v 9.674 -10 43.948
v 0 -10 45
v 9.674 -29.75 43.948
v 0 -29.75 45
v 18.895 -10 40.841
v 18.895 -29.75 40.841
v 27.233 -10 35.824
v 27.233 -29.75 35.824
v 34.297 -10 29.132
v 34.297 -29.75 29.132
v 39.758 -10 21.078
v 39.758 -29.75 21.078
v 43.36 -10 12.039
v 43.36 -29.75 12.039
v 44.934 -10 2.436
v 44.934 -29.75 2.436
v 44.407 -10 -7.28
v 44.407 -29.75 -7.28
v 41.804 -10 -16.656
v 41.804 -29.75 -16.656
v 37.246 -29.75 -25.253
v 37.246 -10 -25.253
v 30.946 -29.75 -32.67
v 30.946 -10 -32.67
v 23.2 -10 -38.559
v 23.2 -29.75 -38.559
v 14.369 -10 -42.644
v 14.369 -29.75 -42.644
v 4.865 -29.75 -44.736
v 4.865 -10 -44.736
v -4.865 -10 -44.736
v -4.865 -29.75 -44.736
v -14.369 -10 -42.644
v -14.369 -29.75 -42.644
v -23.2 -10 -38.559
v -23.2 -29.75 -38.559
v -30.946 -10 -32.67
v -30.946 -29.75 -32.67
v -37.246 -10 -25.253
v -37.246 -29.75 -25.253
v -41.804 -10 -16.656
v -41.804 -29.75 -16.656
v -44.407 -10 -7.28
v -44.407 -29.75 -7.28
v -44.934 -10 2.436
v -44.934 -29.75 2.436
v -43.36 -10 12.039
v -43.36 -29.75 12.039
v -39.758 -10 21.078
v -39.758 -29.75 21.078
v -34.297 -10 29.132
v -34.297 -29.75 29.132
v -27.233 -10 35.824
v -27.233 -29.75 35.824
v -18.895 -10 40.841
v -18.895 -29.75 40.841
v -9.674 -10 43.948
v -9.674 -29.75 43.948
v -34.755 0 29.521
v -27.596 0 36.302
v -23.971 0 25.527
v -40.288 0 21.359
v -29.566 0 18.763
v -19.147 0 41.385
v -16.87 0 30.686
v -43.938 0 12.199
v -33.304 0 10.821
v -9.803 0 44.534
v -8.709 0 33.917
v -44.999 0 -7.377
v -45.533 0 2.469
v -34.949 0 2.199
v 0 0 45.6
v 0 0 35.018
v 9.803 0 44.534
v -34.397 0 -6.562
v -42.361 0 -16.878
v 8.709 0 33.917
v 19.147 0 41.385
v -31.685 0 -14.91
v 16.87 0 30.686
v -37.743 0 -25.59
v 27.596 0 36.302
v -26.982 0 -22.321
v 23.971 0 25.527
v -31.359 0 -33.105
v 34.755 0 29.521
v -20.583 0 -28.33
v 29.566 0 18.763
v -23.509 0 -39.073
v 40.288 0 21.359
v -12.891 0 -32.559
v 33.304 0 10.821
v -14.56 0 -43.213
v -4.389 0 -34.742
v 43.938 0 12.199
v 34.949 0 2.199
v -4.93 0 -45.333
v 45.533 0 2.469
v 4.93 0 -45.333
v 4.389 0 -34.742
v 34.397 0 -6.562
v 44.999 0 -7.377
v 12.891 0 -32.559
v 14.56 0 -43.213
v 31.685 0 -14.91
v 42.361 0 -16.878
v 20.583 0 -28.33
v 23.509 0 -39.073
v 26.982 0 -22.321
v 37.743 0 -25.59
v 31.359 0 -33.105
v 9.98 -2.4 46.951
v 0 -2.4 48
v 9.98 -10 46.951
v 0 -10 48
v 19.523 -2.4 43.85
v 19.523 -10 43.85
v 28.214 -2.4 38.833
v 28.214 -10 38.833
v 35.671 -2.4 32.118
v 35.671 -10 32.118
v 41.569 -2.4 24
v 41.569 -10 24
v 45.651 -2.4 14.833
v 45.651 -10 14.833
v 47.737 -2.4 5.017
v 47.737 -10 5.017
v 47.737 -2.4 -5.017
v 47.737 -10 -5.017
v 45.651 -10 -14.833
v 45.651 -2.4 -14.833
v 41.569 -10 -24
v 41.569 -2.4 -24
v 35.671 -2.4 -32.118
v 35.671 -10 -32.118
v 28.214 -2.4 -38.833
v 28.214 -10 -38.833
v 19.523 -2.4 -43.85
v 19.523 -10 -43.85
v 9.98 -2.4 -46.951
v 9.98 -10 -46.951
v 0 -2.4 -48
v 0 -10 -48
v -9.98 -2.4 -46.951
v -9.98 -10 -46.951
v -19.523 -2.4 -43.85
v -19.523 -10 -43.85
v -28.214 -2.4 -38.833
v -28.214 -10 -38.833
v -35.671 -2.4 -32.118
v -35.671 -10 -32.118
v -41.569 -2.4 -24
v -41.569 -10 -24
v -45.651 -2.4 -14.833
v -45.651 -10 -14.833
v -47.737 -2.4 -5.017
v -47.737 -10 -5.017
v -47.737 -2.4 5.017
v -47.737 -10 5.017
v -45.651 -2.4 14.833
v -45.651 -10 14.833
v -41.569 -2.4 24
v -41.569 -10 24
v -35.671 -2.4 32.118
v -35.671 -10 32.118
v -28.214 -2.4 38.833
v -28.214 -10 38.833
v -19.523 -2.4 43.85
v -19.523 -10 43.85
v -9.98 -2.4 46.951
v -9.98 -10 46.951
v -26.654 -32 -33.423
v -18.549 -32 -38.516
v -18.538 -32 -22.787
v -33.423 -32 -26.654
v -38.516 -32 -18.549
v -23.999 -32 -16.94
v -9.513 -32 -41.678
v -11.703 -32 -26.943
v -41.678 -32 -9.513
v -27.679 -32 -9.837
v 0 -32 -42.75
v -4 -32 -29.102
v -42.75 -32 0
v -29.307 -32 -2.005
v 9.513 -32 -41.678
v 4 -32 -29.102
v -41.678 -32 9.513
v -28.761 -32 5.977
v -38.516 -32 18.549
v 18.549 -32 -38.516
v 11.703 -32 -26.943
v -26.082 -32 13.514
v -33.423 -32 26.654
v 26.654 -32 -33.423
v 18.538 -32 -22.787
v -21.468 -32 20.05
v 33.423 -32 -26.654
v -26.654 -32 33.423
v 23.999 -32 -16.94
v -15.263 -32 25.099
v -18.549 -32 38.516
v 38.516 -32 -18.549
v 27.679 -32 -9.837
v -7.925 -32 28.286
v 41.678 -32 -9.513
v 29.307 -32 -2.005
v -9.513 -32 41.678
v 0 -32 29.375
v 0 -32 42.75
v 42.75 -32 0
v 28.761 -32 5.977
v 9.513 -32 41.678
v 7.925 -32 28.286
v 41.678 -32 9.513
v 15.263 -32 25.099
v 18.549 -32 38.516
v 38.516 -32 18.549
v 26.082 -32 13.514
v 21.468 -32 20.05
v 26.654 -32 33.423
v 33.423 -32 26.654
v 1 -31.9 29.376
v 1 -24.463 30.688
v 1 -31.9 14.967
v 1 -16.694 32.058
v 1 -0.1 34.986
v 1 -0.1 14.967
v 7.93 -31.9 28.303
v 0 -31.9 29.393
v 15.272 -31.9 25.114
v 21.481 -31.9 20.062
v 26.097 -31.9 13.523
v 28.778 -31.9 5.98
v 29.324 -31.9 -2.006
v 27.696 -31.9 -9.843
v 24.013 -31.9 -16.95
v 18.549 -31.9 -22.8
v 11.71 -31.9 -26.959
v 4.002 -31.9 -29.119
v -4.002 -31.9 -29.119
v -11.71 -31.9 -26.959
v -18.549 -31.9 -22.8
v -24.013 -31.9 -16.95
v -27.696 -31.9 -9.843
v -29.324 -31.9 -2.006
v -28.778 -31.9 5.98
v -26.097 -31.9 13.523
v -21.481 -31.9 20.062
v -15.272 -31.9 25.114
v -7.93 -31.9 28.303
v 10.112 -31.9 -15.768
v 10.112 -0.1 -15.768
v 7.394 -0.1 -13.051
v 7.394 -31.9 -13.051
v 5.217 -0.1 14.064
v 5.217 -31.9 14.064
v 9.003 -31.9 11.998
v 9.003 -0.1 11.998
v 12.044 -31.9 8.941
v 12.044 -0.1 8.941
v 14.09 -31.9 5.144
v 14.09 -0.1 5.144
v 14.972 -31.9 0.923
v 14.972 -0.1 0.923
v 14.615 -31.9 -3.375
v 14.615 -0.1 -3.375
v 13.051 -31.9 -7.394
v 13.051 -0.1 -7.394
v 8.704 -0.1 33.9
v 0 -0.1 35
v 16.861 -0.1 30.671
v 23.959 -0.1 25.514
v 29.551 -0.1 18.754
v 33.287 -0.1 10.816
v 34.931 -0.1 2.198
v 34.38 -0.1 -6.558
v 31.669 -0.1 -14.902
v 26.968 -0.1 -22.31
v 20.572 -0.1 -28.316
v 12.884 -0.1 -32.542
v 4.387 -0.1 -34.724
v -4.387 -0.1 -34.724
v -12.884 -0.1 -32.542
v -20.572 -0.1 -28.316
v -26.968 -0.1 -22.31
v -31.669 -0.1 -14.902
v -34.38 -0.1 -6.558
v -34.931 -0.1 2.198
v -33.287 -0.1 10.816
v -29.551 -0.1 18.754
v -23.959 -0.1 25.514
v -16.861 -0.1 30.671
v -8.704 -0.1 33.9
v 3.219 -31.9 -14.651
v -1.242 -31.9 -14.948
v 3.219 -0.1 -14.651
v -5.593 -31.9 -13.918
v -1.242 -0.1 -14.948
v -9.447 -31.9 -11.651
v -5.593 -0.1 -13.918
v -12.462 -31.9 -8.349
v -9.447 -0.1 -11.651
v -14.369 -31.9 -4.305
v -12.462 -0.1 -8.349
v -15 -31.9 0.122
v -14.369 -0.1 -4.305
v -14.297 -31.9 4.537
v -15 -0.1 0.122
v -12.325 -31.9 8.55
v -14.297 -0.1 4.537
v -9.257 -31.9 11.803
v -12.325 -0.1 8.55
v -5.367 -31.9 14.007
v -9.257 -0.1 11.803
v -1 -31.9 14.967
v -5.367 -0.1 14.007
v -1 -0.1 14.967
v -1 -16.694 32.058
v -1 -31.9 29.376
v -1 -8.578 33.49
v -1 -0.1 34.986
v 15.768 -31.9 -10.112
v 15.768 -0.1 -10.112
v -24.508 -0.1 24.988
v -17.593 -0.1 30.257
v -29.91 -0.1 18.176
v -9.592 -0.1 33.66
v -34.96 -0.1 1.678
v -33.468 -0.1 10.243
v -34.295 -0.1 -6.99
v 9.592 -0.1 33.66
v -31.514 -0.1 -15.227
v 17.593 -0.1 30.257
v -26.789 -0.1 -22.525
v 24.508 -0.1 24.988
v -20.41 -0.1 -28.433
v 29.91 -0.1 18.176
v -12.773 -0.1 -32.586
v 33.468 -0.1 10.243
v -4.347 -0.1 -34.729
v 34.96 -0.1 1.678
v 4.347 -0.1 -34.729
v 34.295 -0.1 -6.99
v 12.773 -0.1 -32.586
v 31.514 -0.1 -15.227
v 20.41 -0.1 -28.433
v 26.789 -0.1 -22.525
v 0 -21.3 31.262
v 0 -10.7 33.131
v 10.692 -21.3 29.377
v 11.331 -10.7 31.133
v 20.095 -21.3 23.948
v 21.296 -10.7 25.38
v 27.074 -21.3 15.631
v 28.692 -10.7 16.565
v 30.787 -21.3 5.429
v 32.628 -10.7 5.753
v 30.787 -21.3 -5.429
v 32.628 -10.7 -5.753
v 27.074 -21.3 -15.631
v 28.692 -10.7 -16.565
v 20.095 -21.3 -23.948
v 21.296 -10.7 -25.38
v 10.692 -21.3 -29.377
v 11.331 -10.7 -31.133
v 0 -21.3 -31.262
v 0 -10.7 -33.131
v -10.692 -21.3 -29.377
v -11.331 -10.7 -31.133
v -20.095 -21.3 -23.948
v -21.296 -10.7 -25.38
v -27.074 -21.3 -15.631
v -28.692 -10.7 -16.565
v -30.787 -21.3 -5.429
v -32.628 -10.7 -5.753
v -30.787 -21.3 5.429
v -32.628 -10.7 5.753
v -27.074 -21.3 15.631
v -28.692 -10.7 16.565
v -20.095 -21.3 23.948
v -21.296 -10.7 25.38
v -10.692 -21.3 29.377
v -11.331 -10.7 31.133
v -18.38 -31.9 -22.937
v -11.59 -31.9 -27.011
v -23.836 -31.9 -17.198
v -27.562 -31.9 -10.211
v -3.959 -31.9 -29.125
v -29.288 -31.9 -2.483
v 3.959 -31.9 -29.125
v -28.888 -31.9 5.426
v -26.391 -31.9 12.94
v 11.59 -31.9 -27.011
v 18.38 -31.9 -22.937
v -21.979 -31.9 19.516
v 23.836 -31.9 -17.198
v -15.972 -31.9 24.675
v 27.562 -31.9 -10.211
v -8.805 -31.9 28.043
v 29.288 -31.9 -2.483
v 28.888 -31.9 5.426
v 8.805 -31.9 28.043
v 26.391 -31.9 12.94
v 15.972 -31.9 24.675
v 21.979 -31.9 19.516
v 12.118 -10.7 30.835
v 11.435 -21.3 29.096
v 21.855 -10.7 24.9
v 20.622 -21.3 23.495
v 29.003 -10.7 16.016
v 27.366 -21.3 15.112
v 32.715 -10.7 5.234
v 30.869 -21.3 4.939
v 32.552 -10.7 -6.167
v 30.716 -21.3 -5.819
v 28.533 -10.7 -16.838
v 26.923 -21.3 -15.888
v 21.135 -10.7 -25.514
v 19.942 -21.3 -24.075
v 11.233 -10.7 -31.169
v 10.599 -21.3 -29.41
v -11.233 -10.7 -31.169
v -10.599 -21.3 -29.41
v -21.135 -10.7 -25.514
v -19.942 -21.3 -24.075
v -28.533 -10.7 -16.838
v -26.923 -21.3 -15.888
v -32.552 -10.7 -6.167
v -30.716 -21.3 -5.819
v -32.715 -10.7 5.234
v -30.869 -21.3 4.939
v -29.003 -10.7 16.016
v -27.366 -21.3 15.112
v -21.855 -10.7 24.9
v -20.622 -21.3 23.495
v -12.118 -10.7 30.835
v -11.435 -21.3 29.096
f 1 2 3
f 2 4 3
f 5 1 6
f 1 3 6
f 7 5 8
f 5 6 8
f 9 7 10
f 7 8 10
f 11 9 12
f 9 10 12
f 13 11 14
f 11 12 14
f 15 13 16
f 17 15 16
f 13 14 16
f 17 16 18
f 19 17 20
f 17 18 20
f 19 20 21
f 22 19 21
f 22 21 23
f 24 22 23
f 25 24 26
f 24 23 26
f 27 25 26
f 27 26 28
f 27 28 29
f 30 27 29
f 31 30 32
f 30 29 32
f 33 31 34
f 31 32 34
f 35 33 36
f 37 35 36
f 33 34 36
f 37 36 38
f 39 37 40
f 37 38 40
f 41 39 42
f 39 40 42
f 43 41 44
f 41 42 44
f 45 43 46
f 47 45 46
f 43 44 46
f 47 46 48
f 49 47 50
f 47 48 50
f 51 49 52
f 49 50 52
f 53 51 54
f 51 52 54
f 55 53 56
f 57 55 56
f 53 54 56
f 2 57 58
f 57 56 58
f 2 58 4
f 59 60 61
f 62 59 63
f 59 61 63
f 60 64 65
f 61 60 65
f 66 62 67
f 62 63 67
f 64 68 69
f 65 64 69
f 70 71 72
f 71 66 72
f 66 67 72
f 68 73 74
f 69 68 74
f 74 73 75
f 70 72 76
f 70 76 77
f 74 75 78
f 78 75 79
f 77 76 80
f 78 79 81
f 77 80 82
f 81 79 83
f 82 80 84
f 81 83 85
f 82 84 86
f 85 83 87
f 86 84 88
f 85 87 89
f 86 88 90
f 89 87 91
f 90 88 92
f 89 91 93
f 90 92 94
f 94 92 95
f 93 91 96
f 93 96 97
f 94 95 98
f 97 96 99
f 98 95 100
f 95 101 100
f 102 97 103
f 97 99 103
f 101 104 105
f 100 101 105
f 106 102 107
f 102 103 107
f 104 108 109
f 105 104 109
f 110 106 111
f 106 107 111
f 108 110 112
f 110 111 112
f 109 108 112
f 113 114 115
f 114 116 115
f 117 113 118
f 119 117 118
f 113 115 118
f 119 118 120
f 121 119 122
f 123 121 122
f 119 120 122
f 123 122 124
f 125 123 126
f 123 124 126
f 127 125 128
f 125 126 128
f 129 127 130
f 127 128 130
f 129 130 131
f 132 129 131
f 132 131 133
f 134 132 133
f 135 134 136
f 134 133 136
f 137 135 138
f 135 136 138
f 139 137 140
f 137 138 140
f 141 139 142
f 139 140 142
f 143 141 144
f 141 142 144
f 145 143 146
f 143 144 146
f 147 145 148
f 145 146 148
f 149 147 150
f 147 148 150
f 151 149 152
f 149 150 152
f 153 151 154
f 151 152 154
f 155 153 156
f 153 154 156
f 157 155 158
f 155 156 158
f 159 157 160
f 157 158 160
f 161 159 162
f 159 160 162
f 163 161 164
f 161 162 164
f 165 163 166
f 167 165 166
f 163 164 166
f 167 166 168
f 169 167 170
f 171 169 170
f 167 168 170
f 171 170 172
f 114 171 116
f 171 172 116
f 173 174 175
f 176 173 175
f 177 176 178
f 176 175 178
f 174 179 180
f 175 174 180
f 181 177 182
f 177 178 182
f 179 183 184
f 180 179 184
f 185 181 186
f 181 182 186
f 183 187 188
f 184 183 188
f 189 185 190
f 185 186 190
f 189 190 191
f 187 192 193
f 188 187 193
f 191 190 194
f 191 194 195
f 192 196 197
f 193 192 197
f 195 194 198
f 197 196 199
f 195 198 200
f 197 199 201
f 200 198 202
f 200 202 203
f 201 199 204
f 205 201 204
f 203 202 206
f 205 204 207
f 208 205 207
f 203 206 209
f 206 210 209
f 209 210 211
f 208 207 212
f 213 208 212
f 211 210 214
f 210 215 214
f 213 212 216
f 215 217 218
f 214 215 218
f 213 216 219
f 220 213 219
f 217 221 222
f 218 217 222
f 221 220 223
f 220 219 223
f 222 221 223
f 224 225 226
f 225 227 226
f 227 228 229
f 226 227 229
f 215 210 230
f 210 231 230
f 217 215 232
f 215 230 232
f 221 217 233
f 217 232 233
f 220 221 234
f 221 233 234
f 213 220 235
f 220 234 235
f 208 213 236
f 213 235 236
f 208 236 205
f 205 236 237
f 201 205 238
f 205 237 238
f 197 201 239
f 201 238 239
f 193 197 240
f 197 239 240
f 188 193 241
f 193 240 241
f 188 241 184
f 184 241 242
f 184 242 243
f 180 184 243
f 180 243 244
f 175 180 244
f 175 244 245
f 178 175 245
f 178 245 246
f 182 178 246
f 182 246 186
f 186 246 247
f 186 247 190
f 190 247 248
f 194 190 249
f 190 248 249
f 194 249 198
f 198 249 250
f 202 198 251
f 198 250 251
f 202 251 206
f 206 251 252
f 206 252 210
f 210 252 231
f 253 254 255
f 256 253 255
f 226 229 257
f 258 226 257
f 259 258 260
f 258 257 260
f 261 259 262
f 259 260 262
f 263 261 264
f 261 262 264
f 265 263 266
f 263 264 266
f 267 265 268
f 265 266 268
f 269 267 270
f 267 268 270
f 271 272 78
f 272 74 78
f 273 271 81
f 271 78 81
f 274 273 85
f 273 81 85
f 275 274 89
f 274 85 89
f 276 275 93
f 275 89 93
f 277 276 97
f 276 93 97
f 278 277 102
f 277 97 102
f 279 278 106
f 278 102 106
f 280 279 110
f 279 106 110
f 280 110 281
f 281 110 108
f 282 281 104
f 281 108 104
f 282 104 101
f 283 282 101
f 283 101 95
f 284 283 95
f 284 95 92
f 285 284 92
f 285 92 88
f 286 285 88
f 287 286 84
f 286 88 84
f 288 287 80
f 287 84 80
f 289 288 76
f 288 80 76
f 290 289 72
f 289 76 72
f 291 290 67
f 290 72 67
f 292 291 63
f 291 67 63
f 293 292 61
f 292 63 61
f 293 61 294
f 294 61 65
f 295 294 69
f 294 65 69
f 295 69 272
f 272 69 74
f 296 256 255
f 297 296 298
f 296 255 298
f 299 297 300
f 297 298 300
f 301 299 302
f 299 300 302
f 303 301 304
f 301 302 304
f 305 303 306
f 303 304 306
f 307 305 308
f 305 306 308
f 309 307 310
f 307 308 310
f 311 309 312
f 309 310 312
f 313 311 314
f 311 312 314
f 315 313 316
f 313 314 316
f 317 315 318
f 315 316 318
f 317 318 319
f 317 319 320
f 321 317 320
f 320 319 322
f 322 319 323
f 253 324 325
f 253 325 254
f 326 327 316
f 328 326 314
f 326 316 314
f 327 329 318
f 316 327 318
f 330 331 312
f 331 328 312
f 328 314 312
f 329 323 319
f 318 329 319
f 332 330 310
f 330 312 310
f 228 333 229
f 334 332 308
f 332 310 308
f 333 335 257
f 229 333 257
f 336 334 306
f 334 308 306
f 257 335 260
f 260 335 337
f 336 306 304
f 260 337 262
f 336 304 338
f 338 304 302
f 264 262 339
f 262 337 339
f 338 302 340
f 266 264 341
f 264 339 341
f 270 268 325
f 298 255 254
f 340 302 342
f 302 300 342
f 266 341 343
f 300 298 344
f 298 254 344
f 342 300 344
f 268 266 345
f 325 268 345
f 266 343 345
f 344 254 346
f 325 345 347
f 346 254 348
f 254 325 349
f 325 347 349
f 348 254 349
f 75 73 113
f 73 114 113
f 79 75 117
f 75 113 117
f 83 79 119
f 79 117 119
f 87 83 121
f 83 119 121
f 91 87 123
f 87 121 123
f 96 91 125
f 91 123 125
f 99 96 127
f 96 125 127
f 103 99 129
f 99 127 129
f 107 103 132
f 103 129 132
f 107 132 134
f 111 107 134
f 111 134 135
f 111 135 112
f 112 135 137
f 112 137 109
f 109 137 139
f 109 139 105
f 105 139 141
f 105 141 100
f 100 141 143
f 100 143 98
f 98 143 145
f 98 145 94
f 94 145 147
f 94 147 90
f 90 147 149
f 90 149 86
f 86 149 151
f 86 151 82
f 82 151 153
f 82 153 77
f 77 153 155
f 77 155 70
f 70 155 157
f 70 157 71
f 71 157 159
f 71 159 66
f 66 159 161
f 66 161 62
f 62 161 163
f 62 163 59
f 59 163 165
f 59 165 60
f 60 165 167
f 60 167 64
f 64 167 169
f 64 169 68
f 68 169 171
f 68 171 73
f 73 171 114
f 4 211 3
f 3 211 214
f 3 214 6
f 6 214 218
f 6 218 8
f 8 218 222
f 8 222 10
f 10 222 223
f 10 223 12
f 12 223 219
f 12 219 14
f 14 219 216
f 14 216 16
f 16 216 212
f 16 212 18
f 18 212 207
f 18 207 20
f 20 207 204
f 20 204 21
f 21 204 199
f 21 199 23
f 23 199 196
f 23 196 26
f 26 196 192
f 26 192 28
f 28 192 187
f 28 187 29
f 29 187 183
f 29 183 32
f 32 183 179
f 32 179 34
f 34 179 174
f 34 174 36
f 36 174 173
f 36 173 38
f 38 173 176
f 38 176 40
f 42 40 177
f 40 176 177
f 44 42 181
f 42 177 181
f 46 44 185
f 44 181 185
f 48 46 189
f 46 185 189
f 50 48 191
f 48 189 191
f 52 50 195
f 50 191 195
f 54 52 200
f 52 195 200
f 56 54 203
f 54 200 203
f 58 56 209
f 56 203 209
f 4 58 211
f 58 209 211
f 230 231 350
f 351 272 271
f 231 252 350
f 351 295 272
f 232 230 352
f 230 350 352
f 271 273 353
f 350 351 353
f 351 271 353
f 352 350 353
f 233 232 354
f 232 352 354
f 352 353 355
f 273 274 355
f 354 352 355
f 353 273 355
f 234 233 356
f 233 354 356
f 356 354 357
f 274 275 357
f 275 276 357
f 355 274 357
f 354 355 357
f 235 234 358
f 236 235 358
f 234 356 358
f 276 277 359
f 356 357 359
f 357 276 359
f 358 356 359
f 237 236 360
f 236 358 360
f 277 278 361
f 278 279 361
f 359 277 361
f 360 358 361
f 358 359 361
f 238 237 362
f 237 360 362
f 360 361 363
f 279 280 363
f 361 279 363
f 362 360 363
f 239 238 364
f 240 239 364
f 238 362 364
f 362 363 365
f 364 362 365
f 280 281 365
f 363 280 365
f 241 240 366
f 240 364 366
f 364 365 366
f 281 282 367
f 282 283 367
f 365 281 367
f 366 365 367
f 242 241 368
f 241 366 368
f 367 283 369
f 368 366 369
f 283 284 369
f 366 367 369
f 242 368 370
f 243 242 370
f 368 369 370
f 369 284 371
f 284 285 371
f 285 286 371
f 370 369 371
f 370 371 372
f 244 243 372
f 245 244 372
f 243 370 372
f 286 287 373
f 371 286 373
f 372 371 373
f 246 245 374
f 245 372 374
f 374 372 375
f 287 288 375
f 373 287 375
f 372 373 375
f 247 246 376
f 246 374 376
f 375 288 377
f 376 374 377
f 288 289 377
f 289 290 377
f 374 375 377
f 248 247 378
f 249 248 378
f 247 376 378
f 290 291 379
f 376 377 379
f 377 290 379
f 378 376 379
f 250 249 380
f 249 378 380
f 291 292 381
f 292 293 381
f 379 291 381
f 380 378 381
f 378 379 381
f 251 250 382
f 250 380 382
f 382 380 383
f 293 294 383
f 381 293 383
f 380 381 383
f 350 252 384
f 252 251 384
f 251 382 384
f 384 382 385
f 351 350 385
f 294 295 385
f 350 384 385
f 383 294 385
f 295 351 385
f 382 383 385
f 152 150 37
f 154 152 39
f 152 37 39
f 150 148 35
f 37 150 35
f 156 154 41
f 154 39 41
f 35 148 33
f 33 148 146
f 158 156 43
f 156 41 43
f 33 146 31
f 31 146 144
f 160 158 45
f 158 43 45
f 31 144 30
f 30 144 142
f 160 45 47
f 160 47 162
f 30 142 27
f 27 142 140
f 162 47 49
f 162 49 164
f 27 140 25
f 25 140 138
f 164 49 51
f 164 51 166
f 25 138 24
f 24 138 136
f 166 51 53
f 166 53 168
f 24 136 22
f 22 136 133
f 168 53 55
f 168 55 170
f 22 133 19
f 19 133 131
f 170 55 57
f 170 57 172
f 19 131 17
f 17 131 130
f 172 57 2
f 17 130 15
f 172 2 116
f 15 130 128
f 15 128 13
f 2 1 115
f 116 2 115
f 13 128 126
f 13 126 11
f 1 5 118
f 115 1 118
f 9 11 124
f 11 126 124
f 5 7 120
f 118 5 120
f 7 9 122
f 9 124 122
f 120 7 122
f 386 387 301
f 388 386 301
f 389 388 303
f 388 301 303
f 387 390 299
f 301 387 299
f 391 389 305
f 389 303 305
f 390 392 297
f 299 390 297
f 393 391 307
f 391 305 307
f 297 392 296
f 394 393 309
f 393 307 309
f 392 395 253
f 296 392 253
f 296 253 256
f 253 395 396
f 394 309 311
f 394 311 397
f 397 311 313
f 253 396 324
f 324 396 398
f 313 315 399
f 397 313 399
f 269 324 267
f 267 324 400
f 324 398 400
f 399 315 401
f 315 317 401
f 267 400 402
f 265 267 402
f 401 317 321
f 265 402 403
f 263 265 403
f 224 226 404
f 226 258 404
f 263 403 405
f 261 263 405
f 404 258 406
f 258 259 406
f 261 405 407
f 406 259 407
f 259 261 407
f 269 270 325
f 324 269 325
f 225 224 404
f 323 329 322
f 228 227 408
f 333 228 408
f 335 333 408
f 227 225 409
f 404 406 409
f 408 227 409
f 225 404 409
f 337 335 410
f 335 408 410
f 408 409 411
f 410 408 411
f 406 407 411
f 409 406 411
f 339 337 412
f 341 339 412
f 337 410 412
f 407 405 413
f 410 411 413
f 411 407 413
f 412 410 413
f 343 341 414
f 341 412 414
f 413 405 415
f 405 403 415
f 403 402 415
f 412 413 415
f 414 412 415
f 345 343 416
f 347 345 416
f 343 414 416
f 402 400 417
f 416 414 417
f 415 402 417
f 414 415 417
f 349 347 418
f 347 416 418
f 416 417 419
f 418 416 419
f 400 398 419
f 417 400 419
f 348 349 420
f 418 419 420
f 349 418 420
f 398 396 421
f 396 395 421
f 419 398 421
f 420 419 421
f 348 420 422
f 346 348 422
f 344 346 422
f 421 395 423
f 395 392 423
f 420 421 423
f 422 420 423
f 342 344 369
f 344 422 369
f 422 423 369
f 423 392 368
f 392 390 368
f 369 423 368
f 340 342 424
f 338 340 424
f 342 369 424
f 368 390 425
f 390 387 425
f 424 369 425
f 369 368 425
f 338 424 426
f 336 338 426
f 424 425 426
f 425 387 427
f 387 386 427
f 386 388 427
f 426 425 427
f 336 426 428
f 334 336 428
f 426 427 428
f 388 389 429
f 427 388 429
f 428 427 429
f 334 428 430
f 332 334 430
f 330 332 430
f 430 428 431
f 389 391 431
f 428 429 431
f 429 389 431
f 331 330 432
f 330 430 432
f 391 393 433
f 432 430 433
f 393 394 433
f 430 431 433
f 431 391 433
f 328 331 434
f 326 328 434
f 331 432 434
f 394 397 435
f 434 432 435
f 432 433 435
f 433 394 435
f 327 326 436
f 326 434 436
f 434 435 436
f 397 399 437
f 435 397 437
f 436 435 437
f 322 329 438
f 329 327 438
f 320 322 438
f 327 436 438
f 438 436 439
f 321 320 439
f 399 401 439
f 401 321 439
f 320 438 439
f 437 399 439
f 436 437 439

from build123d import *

# Parameters (mm, degrees)
F4_DEPTH = 31.901


with BuildPart() as f1:
    # F0 (on Right) → F1 (revolve)
    with BuildSketch(Plane.YZ):
        Polygon((0, 35.0176326981), (0, 45.6), (-2.4, 48), (-10, 48), (-10, 45), (-22, 45), (-29.75, 45), (-32, 42.75), (-32, 29.3751693154), (-31.9, 29.3928020135), (-0.1, 35), align=None)
    revolve(axis=Axis((0, -16, 0), (0, 1, 0)))


with BuildPart() as f2:
    # F0 (on Right) → F2 (revolve)
    with BuildSketch(Plane.YZ):
        Polygon((-0.1, 15), (-0.1, 35), (-31.9, 29.3928020135), (-31.9, 15), align=None)
    revolve(axis=Axis((0, -16, 0), (0, 1, 0)))

    # F3 (on face) → F4 (cut, through all)
    with BuildSketch(Plane(origin=(0, -0.1, 0), x_dir=(-1, 0, 0), z_dir=(0, 1, 0))):
        with BuildLine():
            Line((1, 35.0176326981), (-1, 35.0176326981))
            Line((-1, 35.0176326981), (-1, 14.9666295471))
            ThreePointArc((-1, 14.9666295471), (-13.2044625466, 7.1163311373), (-13.0509512749, -7.3940970254))
            Line((-13.0509512749, -7.3940970254), (-15.7684812205, -10.111626971))
            Line((-15.7684812205, -10.111626971), (-10.111626971, -15.7684812205))
            Line((-10.111626971, -15.7684812205), (-7.3940970254, -13.0509512749))
            ThreePointArc((-7.3940970254, -13.0509512749), (14.368971013, -4.3049590043), (1, 14.9666295471))
            Line((1, 14.9666295471), (1, 35.0176326981))
        make_face()
    extrude(amount=-F4_DEPTH, mode=Mode.SUBTRACT)


solid = Compound([f1.part, f2.part])
